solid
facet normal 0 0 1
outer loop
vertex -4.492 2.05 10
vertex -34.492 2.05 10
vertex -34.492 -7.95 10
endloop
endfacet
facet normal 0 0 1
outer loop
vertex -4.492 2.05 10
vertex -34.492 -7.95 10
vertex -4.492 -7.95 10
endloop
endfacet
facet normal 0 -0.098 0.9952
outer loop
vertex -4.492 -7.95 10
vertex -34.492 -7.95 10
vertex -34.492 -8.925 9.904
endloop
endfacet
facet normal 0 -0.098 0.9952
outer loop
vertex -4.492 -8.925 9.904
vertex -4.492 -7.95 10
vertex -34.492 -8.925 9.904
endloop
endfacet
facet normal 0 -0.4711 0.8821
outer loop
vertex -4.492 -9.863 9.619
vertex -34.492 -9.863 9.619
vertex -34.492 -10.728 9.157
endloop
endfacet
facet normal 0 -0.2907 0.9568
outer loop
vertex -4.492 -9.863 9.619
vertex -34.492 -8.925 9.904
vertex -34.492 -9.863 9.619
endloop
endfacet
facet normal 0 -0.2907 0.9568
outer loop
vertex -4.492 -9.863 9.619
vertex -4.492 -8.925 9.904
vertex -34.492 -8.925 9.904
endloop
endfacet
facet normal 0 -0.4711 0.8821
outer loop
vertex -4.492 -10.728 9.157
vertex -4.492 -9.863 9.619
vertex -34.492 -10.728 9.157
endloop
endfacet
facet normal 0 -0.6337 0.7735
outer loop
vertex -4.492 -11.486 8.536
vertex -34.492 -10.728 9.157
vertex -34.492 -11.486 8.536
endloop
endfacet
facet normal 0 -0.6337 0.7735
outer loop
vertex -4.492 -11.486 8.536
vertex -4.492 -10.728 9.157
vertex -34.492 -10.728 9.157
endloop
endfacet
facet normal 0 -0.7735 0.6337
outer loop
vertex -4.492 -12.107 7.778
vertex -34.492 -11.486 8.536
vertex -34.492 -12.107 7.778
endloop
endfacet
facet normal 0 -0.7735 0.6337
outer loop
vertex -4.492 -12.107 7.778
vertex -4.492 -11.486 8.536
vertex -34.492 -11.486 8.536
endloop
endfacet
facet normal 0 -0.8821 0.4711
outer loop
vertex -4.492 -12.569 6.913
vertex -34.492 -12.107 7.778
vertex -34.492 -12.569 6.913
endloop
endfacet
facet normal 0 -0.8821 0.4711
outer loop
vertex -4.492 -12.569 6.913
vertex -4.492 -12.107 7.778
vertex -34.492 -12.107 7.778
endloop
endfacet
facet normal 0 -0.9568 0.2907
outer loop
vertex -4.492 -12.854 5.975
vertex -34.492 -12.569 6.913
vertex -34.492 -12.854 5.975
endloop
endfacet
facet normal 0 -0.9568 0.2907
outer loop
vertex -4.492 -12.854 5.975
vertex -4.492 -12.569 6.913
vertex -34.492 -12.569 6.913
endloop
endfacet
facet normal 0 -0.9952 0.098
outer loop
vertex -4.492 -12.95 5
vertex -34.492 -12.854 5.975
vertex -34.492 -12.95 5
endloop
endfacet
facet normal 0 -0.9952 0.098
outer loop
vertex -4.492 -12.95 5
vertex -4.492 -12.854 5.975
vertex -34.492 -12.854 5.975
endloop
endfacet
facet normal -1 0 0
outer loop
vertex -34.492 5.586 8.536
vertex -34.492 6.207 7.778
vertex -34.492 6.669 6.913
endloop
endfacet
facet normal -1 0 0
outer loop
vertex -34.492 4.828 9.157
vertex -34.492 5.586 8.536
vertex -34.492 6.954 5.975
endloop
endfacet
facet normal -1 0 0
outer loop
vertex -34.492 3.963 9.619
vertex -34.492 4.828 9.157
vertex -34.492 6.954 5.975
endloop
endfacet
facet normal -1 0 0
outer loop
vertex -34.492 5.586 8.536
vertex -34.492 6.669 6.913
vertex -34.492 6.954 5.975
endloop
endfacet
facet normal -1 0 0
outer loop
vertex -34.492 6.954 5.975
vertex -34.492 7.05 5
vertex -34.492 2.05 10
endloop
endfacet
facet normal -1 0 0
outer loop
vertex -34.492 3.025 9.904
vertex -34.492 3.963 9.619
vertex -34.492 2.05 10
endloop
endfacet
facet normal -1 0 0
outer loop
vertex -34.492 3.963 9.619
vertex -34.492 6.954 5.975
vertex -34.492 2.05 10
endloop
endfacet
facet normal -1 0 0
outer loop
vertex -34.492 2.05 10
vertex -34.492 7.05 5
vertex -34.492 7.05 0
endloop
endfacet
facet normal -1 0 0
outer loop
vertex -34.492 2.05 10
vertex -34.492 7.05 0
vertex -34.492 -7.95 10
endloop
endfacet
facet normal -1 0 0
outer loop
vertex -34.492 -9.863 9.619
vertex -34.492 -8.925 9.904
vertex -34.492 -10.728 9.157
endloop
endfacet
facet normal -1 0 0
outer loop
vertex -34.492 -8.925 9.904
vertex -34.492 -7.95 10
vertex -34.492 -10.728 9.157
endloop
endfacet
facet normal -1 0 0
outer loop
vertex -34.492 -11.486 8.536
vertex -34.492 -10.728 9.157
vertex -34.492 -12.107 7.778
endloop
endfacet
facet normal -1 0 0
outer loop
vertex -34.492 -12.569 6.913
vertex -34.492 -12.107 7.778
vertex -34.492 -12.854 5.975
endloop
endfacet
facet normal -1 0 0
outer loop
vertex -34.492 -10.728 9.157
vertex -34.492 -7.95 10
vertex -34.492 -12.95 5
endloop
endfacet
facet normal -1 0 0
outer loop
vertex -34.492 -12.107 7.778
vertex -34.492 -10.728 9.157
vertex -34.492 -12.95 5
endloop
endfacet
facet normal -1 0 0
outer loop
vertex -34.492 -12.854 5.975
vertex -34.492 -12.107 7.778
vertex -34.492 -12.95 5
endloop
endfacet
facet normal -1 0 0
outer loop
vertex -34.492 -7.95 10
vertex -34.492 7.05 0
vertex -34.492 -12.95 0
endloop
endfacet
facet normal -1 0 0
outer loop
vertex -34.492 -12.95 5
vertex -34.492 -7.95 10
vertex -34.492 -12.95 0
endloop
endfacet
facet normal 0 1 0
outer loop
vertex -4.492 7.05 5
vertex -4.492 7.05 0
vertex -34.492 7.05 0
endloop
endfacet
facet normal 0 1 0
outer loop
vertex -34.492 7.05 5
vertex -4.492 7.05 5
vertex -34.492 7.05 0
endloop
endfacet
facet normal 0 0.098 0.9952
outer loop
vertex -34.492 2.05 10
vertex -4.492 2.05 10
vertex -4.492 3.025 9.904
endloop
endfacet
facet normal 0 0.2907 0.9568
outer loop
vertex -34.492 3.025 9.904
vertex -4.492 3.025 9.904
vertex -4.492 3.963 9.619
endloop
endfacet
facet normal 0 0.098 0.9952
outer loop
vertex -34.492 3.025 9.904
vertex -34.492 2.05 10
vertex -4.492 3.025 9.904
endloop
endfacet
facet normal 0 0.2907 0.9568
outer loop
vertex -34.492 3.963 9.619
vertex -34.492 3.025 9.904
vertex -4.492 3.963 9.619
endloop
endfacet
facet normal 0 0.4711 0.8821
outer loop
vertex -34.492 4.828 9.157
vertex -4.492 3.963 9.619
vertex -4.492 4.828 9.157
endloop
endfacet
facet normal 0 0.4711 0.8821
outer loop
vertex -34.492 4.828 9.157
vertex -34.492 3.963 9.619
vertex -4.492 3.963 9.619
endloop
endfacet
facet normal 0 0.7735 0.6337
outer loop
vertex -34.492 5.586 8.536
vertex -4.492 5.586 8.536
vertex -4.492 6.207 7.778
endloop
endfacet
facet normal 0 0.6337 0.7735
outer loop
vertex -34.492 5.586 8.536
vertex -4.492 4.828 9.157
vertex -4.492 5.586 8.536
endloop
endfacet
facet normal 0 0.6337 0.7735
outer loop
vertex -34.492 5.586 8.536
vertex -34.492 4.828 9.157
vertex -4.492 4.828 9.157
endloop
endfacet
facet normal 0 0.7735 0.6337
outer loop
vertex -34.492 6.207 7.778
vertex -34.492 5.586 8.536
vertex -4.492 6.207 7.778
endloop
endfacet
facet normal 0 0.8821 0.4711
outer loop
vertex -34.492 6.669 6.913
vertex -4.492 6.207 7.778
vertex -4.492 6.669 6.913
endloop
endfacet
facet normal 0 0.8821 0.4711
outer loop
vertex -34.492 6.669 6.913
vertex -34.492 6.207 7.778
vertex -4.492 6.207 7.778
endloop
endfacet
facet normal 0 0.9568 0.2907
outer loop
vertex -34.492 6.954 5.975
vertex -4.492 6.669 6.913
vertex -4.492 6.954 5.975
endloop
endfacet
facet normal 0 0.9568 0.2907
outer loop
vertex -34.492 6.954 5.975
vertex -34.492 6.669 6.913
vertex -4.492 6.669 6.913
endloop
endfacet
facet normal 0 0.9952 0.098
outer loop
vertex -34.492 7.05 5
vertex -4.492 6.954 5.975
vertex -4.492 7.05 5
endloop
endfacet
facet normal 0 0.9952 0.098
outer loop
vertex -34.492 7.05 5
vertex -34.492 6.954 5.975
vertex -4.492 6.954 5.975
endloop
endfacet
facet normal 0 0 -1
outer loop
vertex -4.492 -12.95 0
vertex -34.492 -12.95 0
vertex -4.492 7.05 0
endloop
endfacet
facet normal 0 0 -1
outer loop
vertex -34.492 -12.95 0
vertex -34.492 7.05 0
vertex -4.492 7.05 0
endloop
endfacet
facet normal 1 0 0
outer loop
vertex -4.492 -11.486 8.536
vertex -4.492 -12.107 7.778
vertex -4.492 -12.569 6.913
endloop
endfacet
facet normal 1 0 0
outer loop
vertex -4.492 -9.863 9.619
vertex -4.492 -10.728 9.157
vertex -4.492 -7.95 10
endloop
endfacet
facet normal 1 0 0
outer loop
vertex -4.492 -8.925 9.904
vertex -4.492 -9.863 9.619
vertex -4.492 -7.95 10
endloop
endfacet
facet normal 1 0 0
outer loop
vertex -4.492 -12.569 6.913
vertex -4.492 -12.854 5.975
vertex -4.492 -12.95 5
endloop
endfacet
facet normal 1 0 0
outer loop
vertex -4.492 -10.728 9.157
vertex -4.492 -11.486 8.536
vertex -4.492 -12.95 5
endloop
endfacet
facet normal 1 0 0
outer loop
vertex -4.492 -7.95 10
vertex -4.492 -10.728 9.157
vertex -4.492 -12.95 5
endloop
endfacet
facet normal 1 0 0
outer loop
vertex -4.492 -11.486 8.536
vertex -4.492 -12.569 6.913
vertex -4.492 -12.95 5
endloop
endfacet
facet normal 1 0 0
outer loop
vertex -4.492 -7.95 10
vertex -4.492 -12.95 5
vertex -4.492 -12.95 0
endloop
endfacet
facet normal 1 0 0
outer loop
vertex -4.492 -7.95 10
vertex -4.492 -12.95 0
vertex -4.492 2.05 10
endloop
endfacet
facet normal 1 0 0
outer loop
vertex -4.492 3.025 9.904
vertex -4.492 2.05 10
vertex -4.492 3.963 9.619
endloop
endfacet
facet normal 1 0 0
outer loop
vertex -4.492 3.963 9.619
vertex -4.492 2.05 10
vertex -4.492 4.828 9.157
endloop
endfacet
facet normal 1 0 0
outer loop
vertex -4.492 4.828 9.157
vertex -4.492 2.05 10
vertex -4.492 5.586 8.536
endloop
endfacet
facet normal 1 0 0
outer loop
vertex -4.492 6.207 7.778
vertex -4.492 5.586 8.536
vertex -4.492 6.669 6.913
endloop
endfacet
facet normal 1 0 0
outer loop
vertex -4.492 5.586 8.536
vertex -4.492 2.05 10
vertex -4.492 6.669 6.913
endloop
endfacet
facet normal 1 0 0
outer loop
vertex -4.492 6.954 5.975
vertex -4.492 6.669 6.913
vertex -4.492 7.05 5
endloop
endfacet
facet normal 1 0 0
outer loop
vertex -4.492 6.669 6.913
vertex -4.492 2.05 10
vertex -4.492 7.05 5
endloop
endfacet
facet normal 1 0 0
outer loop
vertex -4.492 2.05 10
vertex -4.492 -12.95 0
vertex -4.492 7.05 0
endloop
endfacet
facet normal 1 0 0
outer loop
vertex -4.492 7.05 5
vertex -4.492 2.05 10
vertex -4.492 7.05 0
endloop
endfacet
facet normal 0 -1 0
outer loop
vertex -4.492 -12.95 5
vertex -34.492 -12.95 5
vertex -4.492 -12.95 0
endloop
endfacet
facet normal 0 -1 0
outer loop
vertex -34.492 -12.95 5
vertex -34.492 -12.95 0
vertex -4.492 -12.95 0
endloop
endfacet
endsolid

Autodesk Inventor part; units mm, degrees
ref_plane "YZ Plane" through (0, 0, 0) normal (1, 0, 0) x (0, 1, 0)
ref_plane "XZ Plane" through (0, 0, 0) normal (0, 1, 0) x (-1, 0, 0)
ref_plane "XY Plane" through (0, 0, 0) normal (0, 0, 1) x (1, 0, 0)
sketch "Эскиз1" plane through (0, 0, 0) normal (0, 0, 1) x (1, 0, 0)
  line L0 (5.2271, -13.5) -> (34.3271, -13.5) projected
  line L1 (15.7271, 7.05) -> (6.6989, 7.05) projected
  line L2 (-4.4915, 7.05) -> (-34.4915, 7.05)
  line L3 (-34.4915, 7.05) -> (-34.4915, -12.95)
  line L4 (-34.4915, -12.95) -> (-4.4915, -12.95)
  line L5 (-4.4915, -12.95) -> (-4.4915, 7.05)
  point P0 (0, 0)
  dimension "d0" = 20
  dimension "d2" = 30
extrude "Выдавливание1" add sketch "Эскиз1" along normal blind 10
fillet "Сопряжение1" radius 5 2 edges at (-19.4915, -12.95, 10) (-19.4915, 7.05, 10)
properties part number "Интвертор"
